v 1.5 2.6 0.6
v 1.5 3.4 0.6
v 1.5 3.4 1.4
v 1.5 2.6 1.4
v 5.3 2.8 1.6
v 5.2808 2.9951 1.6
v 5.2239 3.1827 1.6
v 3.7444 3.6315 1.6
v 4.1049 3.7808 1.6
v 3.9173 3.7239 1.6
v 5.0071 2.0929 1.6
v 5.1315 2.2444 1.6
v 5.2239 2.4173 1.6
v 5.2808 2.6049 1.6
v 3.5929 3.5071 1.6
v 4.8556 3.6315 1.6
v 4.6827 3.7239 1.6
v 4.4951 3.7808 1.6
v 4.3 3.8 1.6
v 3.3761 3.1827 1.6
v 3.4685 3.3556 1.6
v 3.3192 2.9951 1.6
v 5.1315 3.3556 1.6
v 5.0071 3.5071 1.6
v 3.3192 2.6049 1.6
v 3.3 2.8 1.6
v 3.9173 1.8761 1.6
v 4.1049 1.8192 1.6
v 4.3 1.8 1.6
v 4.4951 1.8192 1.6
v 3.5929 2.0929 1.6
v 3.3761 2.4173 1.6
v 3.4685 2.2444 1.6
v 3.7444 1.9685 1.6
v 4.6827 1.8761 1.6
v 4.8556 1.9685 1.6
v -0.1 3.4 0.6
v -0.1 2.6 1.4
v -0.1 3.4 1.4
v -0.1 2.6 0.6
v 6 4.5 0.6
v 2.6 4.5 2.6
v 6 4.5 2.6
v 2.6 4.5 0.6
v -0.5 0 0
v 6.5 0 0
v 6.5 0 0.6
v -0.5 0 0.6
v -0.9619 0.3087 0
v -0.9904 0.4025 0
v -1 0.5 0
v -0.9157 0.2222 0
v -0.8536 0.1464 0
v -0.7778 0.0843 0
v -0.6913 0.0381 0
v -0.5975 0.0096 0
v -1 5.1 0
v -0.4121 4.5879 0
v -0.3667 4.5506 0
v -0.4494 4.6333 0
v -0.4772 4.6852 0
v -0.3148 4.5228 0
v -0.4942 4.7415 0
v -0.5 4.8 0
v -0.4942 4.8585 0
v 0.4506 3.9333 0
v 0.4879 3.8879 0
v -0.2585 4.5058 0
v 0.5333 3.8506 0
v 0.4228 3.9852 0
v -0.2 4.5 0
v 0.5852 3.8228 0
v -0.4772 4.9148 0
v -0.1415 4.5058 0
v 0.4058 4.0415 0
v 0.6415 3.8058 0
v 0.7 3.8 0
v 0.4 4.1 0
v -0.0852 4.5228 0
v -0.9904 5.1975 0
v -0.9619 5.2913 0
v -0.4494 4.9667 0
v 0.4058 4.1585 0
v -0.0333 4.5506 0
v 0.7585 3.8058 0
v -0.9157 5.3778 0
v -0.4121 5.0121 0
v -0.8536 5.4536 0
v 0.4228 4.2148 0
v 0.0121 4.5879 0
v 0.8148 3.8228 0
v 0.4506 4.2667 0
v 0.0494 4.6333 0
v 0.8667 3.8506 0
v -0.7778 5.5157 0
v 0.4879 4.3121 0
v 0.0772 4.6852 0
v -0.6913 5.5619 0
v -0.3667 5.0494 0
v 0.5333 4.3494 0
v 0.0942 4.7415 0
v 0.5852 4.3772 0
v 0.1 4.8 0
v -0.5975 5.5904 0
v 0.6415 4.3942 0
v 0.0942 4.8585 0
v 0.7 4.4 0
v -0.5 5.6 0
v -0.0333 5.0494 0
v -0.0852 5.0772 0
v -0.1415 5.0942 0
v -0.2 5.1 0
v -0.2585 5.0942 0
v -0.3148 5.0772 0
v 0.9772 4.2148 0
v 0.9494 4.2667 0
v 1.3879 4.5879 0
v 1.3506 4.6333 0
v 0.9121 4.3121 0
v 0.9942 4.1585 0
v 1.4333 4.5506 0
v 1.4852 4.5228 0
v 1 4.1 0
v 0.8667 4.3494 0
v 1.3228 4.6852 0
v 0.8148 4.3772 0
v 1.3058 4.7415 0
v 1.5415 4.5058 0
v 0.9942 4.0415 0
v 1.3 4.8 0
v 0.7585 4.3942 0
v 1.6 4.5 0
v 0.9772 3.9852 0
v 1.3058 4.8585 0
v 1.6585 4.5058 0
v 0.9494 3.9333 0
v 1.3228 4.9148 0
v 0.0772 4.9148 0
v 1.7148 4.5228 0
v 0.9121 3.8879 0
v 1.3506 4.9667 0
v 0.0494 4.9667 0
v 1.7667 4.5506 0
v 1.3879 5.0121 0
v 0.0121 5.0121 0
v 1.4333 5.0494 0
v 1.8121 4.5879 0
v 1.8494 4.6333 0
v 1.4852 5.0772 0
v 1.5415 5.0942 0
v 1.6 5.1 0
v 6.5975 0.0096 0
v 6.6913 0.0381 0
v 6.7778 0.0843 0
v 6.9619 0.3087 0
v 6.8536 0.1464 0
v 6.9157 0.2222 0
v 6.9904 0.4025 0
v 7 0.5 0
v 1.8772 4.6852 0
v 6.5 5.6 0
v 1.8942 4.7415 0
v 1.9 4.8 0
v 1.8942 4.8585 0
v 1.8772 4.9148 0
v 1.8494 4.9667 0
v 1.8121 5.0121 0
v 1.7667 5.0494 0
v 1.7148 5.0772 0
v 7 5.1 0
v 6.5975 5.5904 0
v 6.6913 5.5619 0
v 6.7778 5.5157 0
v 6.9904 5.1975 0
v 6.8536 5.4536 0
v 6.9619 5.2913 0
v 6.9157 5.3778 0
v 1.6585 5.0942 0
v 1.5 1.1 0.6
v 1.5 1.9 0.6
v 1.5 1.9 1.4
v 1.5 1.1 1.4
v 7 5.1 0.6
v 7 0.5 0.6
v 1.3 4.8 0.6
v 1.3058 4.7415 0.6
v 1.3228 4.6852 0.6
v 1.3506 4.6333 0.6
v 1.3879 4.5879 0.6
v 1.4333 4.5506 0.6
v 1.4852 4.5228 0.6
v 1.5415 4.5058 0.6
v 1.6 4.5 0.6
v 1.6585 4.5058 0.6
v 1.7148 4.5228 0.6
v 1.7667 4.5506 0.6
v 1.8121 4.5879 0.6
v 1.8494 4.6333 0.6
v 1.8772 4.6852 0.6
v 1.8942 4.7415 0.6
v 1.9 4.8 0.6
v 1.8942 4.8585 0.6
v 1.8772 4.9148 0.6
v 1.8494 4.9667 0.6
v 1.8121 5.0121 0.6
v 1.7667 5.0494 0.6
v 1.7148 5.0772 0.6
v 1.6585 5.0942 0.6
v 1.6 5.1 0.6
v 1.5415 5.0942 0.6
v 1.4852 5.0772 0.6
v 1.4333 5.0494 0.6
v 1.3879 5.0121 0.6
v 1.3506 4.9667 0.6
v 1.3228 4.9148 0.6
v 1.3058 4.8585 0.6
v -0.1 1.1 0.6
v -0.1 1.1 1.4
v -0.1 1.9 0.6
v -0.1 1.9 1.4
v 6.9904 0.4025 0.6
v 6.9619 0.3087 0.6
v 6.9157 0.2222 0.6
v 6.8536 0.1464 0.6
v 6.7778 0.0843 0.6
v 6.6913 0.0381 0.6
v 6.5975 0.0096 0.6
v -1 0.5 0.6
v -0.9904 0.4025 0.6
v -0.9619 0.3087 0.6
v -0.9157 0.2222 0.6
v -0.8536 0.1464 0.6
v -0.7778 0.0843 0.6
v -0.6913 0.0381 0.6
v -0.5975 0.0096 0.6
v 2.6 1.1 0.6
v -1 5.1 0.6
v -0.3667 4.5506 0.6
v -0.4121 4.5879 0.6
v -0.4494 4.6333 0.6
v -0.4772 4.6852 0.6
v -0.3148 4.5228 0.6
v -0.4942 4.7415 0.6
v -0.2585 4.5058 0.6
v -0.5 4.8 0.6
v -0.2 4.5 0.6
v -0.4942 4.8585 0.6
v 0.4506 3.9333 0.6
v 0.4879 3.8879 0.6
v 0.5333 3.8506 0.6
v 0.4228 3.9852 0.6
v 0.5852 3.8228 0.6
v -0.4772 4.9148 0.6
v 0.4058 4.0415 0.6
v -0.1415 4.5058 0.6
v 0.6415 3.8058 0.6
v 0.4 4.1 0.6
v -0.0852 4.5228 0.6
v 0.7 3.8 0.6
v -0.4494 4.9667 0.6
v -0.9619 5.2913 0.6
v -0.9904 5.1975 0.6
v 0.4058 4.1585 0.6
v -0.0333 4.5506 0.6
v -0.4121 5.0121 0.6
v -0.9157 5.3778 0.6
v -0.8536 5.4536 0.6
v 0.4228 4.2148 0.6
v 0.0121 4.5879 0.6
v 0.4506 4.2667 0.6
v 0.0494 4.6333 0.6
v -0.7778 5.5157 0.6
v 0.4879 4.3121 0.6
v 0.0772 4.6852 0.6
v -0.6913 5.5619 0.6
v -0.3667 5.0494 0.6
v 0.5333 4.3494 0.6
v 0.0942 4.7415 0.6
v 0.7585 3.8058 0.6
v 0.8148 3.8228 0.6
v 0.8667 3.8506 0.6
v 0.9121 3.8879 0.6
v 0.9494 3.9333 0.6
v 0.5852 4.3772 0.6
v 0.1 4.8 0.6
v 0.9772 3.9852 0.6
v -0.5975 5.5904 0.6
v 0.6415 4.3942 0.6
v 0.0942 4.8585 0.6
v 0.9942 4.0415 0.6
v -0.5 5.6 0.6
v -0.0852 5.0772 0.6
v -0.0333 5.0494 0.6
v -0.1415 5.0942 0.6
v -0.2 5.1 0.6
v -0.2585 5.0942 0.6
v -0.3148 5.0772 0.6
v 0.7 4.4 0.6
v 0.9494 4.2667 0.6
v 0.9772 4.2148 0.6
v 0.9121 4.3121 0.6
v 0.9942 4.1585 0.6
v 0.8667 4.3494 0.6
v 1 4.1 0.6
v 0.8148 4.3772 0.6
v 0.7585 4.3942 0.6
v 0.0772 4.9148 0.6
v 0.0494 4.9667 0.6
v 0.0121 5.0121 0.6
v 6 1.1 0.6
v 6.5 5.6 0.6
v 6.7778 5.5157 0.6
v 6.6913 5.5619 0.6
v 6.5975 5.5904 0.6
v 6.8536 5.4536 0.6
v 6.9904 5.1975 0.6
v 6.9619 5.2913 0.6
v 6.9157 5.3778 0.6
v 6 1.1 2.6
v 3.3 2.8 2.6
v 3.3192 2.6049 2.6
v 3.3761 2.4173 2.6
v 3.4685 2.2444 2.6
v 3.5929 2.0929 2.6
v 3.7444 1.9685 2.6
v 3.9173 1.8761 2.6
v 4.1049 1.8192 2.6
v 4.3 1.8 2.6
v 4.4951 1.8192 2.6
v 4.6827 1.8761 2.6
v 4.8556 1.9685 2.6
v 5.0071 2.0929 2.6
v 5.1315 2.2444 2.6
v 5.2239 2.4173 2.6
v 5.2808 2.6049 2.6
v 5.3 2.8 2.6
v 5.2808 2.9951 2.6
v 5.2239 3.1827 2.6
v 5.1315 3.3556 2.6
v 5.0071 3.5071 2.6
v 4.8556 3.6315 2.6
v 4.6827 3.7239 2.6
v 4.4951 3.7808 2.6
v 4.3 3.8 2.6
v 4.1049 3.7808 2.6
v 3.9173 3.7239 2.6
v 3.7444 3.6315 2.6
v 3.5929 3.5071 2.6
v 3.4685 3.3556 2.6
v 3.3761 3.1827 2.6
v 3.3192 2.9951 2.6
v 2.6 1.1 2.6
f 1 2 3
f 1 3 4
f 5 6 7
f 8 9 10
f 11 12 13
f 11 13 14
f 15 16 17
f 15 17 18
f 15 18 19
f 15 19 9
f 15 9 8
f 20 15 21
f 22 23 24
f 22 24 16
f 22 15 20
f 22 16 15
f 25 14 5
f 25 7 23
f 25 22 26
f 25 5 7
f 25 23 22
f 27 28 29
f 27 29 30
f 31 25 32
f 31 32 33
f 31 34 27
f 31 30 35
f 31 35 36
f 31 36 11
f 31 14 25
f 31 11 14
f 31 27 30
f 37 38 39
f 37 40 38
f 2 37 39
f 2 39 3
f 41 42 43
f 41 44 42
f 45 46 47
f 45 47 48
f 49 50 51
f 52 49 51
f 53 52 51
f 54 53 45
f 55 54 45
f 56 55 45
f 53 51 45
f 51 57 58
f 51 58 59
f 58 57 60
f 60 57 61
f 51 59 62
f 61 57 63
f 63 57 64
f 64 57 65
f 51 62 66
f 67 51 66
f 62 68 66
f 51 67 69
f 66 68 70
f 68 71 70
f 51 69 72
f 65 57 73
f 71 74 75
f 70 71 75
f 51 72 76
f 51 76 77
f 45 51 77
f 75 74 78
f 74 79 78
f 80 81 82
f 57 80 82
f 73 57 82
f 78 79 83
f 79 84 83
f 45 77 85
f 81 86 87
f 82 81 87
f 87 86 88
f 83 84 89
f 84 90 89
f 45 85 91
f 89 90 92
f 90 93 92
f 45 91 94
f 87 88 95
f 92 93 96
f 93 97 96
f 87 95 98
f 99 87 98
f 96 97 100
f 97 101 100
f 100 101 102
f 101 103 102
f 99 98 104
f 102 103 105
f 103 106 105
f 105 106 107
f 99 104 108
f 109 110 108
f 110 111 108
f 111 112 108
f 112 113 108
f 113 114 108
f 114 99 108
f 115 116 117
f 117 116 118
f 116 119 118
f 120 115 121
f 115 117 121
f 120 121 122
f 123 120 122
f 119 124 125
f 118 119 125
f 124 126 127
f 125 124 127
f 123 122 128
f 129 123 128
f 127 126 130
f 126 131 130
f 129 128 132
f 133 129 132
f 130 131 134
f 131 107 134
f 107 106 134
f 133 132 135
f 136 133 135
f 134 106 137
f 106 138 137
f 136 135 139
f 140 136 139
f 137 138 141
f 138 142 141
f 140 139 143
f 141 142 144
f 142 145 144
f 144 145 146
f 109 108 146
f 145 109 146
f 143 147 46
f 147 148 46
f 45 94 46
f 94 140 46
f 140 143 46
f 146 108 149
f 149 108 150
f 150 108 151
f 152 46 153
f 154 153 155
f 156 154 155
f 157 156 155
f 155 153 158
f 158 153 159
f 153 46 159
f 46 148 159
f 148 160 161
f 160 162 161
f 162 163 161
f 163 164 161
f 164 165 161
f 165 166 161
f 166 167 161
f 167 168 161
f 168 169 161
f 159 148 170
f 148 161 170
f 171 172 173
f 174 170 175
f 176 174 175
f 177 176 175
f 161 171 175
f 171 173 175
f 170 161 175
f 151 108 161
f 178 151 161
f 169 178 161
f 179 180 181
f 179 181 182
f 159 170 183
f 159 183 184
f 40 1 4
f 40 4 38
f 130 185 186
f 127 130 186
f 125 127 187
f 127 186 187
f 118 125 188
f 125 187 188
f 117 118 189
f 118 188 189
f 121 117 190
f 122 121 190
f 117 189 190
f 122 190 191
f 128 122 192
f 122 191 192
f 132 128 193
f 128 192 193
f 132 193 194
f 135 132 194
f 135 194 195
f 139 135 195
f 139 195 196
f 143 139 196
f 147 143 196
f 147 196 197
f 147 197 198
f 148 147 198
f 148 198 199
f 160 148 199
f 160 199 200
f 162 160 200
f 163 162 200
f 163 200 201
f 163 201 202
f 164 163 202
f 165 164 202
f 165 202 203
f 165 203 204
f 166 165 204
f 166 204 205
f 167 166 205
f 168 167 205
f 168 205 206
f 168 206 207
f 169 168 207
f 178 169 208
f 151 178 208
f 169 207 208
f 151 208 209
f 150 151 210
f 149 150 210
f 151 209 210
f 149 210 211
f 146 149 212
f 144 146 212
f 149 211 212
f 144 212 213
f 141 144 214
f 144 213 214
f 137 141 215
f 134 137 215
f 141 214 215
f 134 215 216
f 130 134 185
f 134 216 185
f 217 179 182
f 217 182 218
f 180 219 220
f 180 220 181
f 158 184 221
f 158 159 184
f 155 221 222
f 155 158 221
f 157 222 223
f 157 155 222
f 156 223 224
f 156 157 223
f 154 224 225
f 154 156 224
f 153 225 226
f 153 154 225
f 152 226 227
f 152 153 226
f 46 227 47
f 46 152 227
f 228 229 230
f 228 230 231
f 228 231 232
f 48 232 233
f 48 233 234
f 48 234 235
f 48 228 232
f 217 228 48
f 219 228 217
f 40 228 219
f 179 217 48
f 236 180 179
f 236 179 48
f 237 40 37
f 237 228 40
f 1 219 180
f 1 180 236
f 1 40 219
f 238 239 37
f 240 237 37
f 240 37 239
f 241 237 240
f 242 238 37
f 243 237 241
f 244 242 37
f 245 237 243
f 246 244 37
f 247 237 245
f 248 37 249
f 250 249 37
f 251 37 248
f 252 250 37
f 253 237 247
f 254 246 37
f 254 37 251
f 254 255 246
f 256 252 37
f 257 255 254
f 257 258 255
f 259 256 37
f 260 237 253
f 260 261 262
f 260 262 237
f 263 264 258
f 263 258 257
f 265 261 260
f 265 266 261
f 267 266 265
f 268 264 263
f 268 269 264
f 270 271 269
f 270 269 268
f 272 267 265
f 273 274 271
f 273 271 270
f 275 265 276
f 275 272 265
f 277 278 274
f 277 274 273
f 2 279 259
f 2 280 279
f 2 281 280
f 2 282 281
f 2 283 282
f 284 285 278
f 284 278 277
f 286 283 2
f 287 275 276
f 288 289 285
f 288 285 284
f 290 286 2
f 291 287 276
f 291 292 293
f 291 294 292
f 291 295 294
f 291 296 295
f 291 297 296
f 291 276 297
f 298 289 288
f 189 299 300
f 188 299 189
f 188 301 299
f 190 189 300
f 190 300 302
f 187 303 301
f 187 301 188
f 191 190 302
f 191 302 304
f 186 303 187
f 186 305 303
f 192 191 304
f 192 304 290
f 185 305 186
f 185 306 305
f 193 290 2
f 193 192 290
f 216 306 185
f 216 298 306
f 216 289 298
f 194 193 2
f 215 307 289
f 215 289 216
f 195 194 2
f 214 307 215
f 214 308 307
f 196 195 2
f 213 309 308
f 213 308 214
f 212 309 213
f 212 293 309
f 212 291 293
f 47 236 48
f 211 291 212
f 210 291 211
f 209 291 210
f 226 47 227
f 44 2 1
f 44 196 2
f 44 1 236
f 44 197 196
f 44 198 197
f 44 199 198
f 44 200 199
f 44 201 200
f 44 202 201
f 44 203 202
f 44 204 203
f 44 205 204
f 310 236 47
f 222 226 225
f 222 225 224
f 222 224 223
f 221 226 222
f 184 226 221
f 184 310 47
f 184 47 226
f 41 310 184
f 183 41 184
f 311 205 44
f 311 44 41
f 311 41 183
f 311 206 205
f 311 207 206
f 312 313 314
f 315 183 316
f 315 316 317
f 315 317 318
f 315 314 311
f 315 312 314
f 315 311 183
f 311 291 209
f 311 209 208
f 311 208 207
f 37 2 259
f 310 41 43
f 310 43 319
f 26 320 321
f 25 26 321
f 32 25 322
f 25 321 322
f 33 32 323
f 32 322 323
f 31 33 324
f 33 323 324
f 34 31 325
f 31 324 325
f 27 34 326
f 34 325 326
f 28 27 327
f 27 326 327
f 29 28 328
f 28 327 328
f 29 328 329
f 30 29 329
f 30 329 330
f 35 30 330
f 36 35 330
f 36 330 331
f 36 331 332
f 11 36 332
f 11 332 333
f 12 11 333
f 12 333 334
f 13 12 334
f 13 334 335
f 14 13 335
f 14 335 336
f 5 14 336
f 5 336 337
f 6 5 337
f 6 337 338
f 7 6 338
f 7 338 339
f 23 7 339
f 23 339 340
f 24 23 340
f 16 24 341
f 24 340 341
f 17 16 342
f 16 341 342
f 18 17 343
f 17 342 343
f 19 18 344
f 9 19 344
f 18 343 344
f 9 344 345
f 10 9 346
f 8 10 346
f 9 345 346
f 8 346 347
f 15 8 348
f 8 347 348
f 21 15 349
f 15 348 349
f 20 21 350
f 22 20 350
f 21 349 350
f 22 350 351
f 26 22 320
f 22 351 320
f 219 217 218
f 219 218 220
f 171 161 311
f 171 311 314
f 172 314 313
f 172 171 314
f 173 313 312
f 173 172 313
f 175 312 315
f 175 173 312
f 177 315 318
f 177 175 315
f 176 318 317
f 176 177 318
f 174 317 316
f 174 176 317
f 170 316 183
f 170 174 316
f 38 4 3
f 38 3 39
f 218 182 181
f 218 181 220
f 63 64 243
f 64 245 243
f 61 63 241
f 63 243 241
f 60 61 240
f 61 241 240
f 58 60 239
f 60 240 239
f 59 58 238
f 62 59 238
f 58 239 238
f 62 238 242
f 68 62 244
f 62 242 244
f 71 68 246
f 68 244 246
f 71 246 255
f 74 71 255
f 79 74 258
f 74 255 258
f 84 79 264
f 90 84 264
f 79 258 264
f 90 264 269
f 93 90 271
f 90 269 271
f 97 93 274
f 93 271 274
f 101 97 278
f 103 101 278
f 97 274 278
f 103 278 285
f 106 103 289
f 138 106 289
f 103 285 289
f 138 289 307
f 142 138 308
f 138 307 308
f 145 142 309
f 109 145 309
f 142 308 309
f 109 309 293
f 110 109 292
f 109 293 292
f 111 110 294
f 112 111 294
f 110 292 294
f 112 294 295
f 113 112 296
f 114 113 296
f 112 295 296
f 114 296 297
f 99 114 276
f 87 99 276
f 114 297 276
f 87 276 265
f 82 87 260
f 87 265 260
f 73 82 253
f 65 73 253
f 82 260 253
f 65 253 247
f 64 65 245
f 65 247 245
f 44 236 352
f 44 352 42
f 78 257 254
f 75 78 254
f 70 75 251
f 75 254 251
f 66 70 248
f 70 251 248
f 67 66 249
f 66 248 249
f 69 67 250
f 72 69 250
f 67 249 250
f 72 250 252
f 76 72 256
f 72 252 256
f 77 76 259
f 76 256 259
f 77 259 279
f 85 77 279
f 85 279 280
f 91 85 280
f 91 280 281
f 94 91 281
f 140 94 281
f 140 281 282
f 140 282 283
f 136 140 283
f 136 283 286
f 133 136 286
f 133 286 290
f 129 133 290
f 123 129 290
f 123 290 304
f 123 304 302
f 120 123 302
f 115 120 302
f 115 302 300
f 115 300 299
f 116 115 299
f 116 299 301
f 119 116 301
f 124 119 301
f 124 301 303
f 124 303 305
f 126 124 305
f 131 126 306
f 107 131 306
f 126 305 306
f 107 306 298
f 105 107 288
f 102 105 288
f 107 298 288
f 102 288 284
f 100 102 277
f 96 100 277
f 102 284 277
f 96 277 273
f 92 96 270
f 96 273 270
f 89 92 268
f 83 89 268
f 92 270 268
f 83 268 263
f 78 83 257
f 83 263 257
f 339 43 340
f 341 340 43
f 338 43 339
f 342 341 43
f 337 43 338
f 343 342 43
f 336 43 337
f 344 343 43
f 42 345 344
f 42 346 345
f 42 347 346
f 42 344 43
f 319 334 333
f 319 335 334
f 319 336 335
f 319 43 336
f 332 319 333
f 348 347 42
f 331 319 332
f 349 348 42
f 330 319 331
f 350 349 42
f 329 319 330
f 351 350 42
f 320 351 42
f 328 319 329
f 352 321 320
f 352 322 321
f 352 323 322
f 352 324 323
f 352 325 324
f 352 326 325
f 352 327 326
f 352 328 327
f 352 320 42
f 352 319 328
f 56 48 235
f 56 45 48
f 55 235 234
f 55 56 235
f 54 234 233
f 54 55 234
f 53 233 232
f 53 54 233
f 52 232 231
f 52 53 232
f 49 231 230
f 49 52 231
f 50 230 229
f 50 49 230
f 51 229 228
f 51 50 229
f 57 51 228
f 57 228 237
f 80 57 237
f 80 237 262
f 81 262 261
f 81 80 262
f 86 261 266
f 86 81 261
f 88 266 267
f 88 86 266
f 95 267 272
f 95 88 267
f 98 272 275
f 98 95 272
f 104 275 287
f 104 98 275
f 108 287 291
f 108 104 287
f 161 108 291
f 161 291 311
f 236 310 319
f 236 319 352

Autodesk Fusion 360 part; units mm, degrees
sketch "Sketch1" plane through (0, 0, 0) normal (0, 0, 1) x (1, 0, 0)
  line L0 (7, 4.5) -> (7, 0.5)
  line L1 (6.5, 0) -> (0.5, 0)
  arc A0 (6.5, 0) -> (7, 0.5) centre (6.5, 0.5) ccw
  line L2 (0.5, 5.6) -> (6.5, 5.6)
  line L3 (7, 5.1) -> (7, 4.5)
  arc A1 (7, 5.1) -> (6.5, 5.6) centre (6.5, 5.1) ccw
  line L4 (-1, 0.5) -> (-1, 5)
  line L5 (-1, 5) -> (-1, 5.1)
  line L6 (-0.5, 5.6) -> (0.5, 5.6)
  line L7 (-0.5, 0) -> (0.5, 0)
  arc A2 (-0.5, 5.6) -> (-1, 5.1) centre (-0.5, 5.1) ccw
  arc A3 (-1, 0.5) -> (-0.5, 0) centre (-0.5, 0.5) ccw
extrude "Extrude1" add sketch "Sketch1" along normal blind 0.6
sketch "Sketch7" plane through (0, 0, 0.6) normal (0, 0, 1) x (-1, 0, 0)
  line L0 (0.5, 0) -> (-6.5, 0)
  arc A0 (-6.5, 0) -> (-7, -0.5) centre (-6.5, -0.5) ccw
  line L1 (-7, -0.5) -> (-7, -4.5)
  line L2 (-7, -4.5) -> (-7, -5.1)
  arc A1 (-7, -5.1) -> (-6.5, -5.6) centre (-6.5, -5.1) ccw
  line L3 (-6.5, -5.6) -> (0.5, -5.6)
  line L4 (-2.6, -2.8) -> (-2.6, -4.5)
  line L5 (-2.6, -4.5) -> (-6, -4.5)
  line L6 (-6, -4.5) -> (-6, -1.1)
  line L7 (-6, -1.1) -> (-2.6, -1.1)
  line L8 (-2.6, -1.1) -> (-2.6, -2.8)
  line L9 (1, -5.1) -> (1, -0.5)
  arc A2 (1, -0.5) -> (0.5, 0) centre (0.5, -0.5) ccw
  arc A3 (0.5, -5.6) -> (1, -5.1) centre (0.5, -5.1) ccw
  dimension "d30" = 1.7
  dimension "d31" = 3.4
  dimension "d32" = 3.4
extrude "Extrude7" add sketch "Sketch7" along normal blind 2 contours L4 L5 L6 L7 L8
sketch "Sketch8" plane through (0, 0, 2.6) normal (0, 0, 1) x (-1, 0, 0)
  line L0 (-2.6, -1.1) -> (-6, -1.1)
  line L1 (-6, -1.1) -> (-6, -4.5)
  line L2 (-6, -4.5) -> (-2.6, -4.5)
  line L3 (-2.6, -4.5) -> (-2.6, -2.8)
  line L4 (-2.6, -2.8) -> (-2.6, -1.1)
  circle A0 centre (-4.3, -2.8) radius 1
extrude "Extrude8" cut sketch "Sketch8" against normal blind 1 contours A0
sketch "Sketch9" plane through (0, 0, 0.6) normal (0, 0, 1) x (-1, 0, 0)
  line L0 (-2.6, -1.1) -> (-2.6, -2.8)
  line L1 (-2.6, -2.8) -> (-2.6, -4.5)
  line L2 (-2.6, -4.5) -> (-6, -4.5)
  line L3 (-6, -4.5) -> (-6, -1.1)
  line L4 (-6, -1.1) -> (-2.6, -1.1)
  line L5 (-7, -4.5) -> (-7, -5.1)
  arc A0 (-7, -5.1) -> (-6.5, -5.6) centre (-6.5, -5.1) ccw
  line L6 (-6.5, -5.6) -> (0.5, -5.6)
  line L7 (0.5, 0) -> (-6.5, 0)
  arc A1 (-6.5, 0) -> (-7, -0.5) centre (-6.5, -0.5) ccw
  line L8 (-7, -0.5) -> (-7, -4.5)
  line L9 (-1.5, -1.1) -> (0.1, -1.1)
  line L10 (0.1, -1.1) -> (0.1, -1.9)
  line L11 (0.1, -1.9) -> (-1.5, -1.9)
  line L12 (-1.5, -1.9) -> (-1.5, -1.1)
  line L13 (-1.5, -2.6) -> (0.1, -2.6)
  line L14 (0.1, -2.6) -> (0.1, -3.4)
  line L15 (0.1, -3.4) -> (-1.5, -3.4)
  line L16 (-1.5, -3.4) -> (-1.5, -2.6)
  line L17 (1, -5.1) -> (1, -0.5)
  arc A2 (1, -0.5) -> (0.5, 0) centre (0.5, -0.5) ccw
  arc A3 (0.5, -5.6) -> (1, -5.1) centre (0.5, -5.1) ccw
extrude "Extrude9" add sketch "Sketch9" along normal blind 0.8 contours L9 L10 L11 L12 | L13 L14 L15 L16
sketch "Sketch10" plane through (0, 0, 0.6) normal (0, 0, 1) x (-1, 0, 0)
  line L0 (-2.6, -1.1) -> (-2.6, -2.8)
  line L1 (-2.6, -2.8) -> (-2.6, -4.5)
  line L2 (-2.6, -4.5) -> (-6, -4.5)
  line L3 (-6, -4.5) -> (-6, -1.1)
  line L4 (-6, -1.1) -> (-2.6, -1.1)
  line L5 (-7, -4.5) -> (-7, -5.1)
  arc A0 (-7, -5.1) -> (-6.5, -5.6) centre (-6.5, -5.1) ccw
  line L6 (-6.5, -5.6) -> (0.5, -5.6)
  line L7 (0.5, 0) -> (-6.5, 0)
  arc A1 (-6.5, 0) -> (-7, -0.5) centre (-6.5, -0.5) ccw
  line L8 (-7, -0.5) -> (-7, -4.5)
  circle A2 centre (0.2, -4.8) radius 0.3
  circle A3 centre (-1.6, -4.8) radius 0.3
  circle A4 centre (-0.7, -4.1) radius 0.3
  line L9 (-1.5, -1.1) -> (0.1, -1.1)
  line L10 (0.1, -3.4) -> (-1.5, -3.4)
  line L11 (-1.5, -3.4) -> (-1.5, -2.6)
  line L12 (-1.5, -2.6) -> (0.1, -2.6)
  line L13 (0.1, -1.9) -> (-1.5, -1.9)
  line L14 (-1.5, -1.9) -> (-1.5, -1.1)
  line L15 (0.1, -1.1) -> (0.1, -1.9)
  line L16 (0.1, -2.6) -> (0.1, -3.4)
  line L17 (1, -5.1) -> (1, -0.5)
  arc A5 (1, -0.5) -> (0.5, 0) centre (0.5, -0.5) ccw
  arc A6 (0.5, -5.6) -> (1, -5.1) centre (0.5, -5.1) ccw
extrude "Extrude10" cut sketch "Sketch10" against normal blind 0.6 contours A2 | A3 | A4
